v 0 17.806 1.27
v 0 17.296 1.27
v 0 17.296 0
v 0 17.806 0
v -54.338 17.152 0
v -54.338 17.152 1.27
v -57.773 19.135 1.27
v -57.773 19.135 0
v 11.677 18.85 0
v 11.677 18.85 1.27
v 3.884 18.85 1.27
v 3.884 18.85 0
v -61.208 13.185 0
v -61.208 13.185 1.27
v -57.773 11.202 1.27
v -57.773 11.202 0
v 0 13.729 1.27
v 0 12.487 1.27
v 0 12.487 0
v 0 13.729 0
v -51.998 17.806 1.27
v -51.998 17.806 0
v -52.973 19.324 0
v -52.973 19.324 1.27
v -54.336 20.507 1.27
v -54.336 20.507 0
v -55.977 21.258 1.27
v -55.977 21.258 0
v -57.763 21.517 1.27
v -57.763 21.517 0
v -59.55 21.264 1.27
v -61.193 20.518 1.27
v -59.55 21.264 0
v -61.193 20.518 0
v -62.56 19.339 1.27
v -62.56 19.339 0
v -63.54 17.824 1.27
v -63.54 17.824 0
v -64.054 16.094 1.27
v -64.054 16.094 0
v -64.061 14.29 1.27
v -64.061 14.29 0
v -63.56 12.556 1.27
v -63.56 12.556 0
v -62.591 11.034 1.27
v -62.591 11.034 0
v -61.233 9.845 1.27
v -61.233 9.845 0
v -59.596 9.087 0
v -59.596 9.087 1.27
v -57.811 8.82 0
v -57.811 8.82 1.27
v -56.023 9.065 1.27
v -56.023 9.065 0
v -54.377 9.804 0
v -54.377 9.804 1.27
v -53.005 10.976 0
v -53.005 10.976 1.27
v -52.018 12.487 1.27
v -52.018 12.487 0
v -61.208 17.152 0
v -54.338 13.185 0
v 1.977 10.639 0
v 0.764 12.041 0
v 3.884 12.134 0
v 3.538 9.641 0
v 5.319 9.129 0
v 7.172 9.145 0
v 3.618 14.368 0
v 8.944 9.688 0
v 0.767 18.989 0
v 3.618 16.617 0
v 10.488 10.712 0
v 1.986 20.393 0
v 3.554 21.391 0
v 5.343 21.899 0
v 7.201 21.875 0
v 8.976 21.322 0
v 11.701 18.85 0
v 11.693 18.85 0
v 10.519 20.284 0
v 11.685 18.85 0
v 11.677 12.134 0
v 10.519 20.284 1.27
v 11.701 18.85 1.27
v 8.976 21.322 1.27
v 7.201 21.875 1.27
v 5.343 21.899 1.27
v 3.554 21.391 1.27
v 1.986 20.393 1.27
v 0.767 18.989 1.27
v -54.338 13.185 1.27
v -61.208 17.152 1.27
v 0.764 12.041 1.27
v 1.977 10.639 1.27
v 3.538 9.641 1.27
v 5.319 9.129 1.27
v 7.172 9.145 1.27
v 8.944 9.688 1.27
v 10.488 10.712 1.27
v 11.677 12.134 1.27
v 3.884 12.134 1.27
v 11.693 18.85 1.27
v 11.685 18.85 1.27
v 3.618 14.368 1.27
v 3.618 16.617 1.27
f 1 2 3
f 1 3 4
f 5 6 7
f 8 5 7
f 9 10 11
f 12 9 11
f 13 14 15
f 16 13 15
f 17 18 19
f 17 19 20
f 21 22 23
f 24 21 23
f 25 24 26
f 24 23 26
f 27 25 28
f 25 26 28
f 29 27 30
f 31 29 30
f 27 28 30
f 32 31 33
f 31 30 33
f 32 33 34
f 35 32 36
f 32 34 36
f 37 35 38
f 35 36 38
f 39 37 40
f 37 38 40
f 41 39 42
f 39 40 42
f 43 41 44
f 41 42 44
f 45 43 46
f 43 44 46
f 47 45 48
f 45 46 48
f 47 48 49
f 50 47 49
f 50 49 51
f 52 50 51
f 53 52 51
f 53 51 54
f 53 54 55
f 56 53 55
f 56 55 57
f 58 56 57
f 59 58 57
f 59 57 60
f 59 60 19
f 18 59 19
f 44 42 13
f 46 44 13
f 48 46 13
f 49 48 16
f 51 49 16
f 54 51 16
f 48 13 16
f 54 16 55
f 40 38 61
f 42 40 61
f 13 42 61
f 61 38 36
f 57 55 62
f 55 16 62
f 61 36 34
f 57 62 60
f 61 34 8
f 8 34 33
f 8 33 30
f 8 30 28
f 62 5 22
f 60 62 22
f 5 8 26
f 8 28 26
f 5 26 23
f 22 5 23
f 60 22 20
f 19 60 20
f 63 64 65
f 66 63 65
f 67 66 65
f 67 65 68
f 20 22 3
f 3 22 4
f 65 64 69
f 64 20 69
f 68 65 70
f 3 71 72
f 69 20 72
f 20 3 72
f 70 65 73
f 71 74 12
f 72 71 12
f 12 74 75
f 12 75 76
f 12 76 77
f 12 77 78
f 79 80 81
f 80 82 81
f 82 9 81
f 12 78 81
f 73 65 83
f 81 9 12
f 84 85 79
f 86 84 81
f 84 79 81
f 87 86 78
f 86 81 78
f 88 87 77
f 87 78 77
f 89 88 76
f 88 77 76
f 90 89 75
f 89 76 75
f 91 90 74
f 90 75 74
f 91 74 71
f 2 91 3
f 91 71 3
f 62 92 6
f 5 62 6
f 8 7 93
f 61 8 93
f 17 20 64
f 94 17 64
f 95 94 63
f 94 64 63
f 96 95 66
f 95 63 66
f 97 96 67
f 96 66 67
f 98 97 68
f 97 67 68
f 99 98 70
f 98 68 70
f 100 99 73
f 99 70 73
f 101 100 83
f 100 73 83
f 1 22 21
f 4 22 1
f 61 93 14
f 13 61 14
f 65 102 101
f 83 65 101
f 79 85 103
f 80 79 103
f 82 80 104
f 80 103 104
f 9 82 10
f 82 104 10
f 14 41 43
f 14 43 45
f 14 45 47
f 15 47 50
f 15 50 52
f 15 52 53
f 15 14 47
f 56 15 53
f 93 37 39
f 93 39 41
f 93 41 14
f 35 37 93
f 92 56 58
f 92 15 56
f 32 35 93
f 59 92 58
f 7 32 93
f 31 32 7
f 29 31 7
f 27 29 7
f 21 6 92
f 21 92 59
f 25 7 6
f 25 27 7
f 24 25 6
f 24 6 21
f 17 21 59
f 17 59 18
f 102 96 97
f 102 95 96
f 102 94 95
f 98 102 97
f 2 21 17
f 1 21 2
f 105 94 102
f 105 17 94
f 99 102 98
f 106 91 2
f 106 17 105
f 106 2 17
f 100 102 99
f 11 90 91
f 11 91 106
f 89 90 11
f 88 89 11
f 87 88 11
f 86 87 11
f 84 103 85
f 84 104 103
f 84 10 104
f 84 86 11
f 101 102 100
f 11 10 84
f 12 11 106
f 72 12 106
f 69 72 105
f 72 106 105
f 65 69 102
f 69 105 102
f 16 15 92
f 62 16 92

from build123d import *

# Parameters (mm, degrees)
F0_R          = 6.349014
F1_DEPTH      = 1.27
F2_DEPTH      = 1.27
F3_W          = 52.788634
F3_H          = 5.319013
F4_DEPTH      = 1.27
F5_R          = 6.442503
F6_DEPTH      = 1.27
F8_DEPTH      = 12.7
F8_DEPTH_BACK = 25.4
F10_DEPTH     = 12.7


with BuildPart() as f1:
    # F0 (on Top) → F1 (new body)
    with BuildSketch(Plane.XY):
        with Locations((-57.772908, 15.168429)):
            Circle(F0_R)
    extrude(amount=F1_DEPTH)

    # F0 (on Top) → F2 (join)
    with BuildSketch(Plane.XY):
        with Locations((-57.772908, 15.168429)):
            Circle(F0_R)
    extrude(amount=F2_DEPTH)

    # F3 (on Top) → F4 (join)
    with BuildSketch(Plane.XY):
        with Locations((-26.394317, 15.146691)):
            Rectangle(F3_W, F3_H)
    extrude(amount=F4_DEPTH)

    # F5 (on Top) → F6 (join)
    with BuildSketch(Plane.XY):
        with Locations((6.190753, 15.51234)):
            Circle(F5_R)
    extrude(amount=F6_DEPTH)

    # F7 (on face) → F8 (cut, two sides)
    with BuildSketch(Plane.XY.offset(1.27)) as f8_sk:
        Polygon((-54.338023, 13.185297), (-54.338023, 17.151561), (-57.772908, 19.134693), (-61.207794, 17.151561), (-61.207794, 13.185297), (-57.772908, 11.202165), align=None)
    extrude(amount=-F8_DEPTH, mode=Mode.SUBTRACT)
    extrude(f8_sk.sketch, amount=-F8_DEPTH_BACK, mode=Mode.SUBTRACT)

    # F9 (on face) → F10 (cut)
    with BuildSketch(Plane.XY.offset(1.27)):
        with BuildLine():
            Line((3.883671, 12.134312), (11.676623, 12.134312))
            ThreePointArc((11.676623, 12.134312), (15.03445, 15.492139), (11.676623, 18.849965))
            Line((11.676623, 18.849965), (3.883671, 18.849965))
            ThreePointArc((3.883671, 18.849965), (3.584843, 15.492139), (3.883671, 12.134312))
        make_face()
    extrude(amount=-F10_DEPTH, mode=Mode.SUBTRACT)


solid = f1.part
